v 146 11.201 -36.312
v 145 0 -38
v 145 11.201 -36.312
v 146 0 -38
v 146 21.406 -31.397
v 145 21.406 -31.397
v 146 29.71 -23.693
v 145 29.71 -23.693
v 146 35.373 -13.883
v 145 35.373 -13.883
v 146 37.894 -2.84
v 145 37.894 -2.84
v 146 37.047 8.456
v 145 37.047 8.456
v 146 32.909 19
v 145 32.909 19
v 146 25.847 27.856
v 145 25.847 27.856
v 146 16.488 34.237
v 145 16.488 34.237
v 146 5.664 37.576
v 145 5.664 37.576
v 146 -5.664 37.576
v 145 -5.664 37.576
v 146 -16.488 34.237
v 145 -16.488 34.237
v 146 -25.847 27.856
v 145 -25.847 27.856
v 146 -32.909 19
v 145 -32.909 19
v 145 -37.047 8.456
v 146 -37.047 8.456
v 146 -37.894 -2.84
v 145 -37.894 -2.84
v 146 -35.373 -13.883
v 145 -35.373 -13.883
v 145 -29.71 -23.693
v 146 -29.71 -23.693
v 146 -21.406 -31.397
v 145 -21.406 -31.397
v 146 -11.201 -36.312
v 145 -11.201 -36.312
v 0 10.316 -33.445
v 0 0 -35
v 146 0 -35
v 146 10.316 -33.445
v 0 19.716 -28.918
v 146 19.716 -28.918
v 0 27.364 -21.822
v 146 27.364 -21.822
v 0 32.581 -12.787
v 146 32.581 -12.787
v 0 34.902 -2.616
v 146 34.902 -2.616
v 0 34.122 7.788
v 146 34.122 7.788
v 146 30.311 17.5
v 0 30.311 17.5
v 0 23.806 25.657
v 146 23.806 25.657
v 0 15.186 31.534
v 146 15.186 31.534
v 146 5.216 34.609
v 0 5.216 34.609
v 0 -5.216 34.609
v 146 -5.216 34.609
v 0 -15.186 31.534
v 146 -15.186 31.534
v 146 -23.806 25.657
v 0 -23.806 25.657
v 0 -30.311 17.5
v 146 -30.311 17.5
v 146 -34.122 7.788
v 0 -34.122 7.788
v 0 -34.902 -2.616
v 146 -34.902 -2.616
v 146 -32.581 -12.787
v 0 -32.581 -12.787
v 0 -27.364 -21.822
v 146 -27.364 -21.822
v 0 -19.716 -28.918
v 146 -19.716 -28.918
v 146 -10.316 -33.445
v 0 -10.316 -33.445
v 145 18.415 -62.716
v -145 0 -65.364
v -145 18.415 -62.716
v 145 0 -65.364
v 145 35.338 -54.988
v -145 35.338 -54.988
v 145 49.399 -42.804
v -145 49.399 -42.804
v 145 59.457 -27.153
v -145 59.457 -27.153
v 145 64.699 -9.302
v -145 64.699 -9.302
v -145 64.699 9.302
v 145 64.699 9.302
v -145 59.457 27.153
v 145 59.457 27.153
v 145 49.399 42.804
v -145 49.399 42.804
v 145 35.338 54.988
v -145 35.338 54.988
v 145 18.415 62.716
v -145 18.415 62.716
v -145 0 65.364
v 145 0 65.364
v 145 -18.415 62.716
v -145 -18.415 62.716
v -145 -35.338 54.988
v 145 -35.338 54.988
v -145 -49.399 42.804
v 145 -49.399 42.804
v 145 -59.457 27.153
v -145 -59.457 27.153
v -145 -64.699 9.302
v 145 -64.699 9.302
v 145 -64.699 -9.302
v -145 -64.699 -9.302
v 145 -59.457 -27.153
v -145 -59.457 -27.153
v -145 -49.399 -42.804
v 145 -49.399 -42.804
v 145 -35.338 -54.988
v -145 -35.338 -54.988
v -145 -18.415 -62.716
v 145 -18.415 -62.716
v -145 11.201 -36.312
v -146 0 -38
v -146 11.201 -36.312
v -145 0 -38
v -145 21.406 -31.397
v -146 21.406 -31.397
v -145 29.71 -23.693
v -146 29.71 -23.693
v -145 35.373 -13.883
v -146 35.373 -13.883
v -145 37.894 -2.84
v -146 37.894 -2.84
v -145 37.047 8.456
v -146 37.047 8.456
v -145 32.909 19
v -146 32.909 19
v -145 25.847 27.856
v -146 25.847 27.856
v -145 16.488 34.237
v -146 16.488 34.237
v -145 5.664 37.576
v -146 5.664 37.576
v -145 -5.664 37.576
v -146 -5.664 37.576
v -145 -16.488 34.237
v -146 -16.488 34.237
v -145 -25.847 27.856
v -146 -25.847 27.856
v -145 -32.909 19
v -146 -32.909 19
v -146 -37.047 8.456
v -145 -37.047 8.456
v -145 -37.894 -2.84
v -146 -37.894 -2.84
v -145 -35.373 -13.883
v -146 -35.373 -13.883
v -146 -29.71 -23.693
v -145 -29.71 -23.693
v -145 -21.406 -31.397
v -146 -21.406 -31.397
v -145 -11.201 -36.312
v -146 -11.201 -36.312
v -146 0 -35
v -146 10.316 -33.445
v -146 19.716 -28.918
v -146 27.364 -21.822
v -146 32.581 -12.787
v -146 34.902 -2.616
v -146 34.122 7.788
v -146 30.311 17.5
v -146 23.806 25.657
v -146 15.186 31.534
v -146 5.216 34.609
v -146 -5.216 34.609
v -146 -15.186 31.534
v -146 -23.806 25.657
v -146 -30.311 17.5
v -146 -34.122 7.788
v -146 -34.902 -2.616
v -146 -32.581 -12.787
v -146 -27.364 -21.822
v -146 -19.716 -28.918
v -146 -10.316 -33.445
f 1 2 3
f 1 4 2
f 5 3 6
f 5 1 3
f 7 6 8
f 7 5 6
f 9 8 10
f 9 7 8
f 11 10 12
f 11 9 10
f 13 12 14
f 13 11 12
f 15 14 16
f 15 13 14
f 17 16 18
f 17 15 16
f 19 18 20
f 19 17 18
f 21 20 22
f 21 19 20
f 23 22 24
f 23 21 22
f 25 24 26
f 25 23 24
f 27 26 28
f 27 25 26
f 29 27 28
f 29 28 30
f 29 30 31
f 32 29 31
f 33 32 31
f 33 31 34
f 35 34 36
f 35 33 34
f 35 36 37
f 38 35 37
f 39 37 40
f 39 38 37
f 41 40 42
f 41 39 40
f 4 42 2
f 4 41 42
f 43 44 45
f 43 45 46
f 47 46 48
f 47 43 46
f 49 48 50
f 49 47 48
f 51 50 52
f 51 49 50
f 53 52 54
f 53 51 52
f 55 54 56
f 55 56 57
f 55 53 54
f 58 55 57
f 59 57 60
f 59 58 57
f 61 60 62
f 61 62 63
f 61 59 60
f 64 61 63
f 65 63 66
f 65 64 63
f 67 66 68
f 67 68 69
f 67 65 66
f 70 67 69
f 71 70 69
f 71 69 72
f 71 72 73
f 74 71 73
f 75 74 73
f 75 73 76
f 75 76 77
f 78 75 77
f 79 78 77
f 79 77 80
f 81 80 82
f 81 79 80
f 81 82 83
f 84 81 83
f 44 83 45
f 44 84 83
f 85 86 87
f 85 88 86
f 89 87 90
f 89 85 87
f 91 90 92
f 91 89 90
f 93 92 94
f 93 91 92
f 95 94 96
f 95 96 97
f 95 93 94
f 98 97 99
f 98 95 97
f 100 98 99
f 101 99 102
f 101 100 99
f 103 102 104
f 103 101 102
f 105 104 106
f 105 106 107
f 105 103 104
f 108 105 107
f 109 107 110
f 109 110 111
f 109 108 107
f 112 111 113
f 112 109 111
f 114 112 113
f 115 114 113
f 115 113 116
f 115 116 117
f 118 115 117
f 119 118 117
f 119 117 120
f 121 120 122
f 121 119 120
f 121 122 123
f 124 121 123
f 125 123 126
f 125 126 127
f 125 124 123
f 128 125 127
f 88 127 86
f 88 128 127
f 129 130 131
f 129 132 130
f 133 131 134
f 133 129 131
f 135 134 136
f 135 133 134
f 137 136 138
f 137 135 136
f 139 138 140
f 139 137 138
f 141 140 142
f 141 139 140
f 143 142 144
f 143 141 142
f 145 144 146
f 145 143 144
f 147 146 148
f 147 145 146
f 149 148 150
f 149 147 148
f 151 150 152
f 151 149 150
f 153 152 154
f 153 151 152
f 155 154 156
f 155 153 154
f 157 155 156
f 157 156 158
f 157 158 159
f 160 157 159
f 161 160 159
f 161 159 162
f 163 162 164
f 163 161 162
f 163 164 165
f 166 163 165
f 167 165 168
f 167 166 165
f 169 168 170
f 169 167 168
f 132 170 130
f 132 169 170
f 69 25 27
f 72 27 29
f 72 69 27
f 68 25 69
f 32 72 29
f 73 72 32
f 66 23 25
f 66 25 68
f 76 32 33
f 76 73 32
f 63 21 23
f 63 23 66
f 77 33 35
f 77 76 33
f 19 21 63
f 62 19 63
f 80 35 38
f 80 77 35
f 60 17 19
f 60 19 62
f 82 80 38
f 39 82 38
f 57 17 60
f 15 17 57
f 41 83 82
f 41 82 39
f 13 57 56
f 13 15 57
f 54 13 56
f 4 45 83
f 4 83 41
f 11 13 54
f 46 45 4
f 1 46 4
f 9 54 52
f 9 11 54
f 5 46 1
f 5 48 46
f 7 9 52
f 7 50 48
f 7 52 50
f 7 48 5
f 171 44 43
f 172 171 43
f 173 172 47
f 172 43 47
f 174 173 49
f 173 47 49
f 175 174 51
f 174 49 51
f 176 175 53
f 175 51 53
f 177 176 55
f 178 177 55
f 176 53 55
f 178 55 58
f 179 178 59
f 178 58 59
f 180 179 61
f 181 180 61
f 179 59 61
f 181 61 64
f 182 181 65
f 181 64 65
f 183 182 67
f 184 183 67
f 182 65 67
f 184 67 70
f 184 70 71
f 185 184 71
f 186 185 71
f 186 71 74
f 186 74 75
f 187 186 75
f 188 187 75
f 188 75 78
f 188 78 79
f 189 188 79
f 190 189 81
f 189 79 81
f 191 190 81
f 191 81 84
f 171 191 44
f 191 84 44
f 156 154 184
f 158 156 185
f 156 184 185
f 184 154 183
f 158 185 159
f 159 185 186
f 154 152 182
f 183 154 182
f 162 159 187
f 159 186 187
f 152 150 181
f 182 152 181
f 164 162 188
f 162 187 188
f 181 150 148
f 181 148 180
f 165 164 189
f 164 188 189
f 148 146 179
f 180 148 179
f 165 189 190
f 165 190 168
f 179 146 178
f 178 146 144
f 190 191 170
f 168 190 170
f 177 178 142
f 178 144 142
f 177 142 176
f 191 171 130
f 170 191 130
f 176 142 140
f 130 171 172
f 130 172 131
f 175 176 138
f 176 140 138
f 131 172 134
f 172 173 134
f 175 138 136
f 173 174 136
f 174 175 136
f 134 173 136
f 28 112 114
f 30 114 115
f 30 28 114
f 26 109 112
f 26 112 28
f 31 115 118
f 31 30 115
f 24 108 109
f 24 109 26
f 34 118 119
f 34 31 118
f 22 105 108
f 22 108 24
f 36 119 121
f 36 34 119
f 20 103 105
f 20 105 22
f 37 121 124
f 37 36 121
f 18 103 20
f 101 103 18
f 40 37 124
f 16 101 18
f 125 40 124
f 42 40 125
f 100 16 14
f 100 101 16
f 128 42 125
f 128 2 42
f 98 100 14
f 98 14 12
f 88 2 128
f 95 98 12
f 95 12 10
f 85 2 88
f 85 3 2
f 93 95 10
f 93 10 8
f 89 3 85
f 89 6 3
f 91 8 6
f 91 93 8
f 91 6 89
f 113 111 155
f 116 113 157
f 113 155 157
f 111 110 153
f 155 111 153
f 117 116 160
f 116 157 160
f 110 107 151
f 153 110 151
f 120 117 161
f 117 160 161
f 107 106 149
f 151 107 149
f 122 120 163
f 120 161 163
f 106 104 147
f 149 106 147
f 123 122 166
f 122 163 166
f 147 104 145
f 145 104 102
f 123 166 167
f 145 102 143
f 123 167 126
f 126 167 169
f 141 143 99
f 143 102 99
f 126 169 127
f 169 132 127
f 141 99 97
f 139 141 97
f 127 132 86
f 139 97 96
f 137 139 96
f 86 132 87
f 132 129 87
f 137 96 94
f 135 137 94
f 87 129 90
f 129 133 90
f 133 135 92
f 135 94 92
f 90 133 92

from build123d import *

# Parameters (mm, degrees)
SALIENTE_EXTRUIR1_DEPTH      = 146
SALIENTE_EXTRUIR1_DEPTH_BACK = 146
CROQUIS1_R                   = 38
CROQUIS1_R_2                 = 35
SALIENTE_EXTRUIR2_DEPTH      = 145
SALIENTE_EXTRUIR2_DEPTH_BACK = 145
CROQUIS2_R                   = 65.363922799
CROQUIS2_R_2                 = 38


with BuildPart() as part:
    # Croquis1 → Saliente-Extruir1 (new, two sides: drawn at the far end of the back side and taken through both)
    with BuildSketch(Plane(origin=(0, 0, 0), x_dir=(0, 0, -1), z_dir=(1, 0, 0)).offset(-SALIENTE_EXTRUIR1_DEPTH_BACK)):
        Circle(CROQUIS1_R)
        Circle(CROQUIS1_R_2, mode=Mode.SUBTRACT)
    extrude(amount=SALIENTE_EXTRUIR1_DEPTH + SALIENTE_EXTRUIR1_DEPTH_BACK)

    # Croquis2 → Saliente-Extruir2 (add, two sides: drawn at the far end of the back side and taken through both)
    with BuildSketch(Plane(origin=(0, 0, 0), x_dir=(0, 0, -1), z_dir=(1, 0, 0)).offset(-SALIENTE_EXTRUIR2_DEPTH_BACK)):
        Circle(CROQUIS2_R)
        Circle(CROQUIS2_R_2, mode=Mode.SUBTRACT)
    extrude(amount=SALIENTE_EXTRUIR2_DEPTH + SALIENTE_EXTRUIR2_DEPTH_BACK)


solid = part.part
